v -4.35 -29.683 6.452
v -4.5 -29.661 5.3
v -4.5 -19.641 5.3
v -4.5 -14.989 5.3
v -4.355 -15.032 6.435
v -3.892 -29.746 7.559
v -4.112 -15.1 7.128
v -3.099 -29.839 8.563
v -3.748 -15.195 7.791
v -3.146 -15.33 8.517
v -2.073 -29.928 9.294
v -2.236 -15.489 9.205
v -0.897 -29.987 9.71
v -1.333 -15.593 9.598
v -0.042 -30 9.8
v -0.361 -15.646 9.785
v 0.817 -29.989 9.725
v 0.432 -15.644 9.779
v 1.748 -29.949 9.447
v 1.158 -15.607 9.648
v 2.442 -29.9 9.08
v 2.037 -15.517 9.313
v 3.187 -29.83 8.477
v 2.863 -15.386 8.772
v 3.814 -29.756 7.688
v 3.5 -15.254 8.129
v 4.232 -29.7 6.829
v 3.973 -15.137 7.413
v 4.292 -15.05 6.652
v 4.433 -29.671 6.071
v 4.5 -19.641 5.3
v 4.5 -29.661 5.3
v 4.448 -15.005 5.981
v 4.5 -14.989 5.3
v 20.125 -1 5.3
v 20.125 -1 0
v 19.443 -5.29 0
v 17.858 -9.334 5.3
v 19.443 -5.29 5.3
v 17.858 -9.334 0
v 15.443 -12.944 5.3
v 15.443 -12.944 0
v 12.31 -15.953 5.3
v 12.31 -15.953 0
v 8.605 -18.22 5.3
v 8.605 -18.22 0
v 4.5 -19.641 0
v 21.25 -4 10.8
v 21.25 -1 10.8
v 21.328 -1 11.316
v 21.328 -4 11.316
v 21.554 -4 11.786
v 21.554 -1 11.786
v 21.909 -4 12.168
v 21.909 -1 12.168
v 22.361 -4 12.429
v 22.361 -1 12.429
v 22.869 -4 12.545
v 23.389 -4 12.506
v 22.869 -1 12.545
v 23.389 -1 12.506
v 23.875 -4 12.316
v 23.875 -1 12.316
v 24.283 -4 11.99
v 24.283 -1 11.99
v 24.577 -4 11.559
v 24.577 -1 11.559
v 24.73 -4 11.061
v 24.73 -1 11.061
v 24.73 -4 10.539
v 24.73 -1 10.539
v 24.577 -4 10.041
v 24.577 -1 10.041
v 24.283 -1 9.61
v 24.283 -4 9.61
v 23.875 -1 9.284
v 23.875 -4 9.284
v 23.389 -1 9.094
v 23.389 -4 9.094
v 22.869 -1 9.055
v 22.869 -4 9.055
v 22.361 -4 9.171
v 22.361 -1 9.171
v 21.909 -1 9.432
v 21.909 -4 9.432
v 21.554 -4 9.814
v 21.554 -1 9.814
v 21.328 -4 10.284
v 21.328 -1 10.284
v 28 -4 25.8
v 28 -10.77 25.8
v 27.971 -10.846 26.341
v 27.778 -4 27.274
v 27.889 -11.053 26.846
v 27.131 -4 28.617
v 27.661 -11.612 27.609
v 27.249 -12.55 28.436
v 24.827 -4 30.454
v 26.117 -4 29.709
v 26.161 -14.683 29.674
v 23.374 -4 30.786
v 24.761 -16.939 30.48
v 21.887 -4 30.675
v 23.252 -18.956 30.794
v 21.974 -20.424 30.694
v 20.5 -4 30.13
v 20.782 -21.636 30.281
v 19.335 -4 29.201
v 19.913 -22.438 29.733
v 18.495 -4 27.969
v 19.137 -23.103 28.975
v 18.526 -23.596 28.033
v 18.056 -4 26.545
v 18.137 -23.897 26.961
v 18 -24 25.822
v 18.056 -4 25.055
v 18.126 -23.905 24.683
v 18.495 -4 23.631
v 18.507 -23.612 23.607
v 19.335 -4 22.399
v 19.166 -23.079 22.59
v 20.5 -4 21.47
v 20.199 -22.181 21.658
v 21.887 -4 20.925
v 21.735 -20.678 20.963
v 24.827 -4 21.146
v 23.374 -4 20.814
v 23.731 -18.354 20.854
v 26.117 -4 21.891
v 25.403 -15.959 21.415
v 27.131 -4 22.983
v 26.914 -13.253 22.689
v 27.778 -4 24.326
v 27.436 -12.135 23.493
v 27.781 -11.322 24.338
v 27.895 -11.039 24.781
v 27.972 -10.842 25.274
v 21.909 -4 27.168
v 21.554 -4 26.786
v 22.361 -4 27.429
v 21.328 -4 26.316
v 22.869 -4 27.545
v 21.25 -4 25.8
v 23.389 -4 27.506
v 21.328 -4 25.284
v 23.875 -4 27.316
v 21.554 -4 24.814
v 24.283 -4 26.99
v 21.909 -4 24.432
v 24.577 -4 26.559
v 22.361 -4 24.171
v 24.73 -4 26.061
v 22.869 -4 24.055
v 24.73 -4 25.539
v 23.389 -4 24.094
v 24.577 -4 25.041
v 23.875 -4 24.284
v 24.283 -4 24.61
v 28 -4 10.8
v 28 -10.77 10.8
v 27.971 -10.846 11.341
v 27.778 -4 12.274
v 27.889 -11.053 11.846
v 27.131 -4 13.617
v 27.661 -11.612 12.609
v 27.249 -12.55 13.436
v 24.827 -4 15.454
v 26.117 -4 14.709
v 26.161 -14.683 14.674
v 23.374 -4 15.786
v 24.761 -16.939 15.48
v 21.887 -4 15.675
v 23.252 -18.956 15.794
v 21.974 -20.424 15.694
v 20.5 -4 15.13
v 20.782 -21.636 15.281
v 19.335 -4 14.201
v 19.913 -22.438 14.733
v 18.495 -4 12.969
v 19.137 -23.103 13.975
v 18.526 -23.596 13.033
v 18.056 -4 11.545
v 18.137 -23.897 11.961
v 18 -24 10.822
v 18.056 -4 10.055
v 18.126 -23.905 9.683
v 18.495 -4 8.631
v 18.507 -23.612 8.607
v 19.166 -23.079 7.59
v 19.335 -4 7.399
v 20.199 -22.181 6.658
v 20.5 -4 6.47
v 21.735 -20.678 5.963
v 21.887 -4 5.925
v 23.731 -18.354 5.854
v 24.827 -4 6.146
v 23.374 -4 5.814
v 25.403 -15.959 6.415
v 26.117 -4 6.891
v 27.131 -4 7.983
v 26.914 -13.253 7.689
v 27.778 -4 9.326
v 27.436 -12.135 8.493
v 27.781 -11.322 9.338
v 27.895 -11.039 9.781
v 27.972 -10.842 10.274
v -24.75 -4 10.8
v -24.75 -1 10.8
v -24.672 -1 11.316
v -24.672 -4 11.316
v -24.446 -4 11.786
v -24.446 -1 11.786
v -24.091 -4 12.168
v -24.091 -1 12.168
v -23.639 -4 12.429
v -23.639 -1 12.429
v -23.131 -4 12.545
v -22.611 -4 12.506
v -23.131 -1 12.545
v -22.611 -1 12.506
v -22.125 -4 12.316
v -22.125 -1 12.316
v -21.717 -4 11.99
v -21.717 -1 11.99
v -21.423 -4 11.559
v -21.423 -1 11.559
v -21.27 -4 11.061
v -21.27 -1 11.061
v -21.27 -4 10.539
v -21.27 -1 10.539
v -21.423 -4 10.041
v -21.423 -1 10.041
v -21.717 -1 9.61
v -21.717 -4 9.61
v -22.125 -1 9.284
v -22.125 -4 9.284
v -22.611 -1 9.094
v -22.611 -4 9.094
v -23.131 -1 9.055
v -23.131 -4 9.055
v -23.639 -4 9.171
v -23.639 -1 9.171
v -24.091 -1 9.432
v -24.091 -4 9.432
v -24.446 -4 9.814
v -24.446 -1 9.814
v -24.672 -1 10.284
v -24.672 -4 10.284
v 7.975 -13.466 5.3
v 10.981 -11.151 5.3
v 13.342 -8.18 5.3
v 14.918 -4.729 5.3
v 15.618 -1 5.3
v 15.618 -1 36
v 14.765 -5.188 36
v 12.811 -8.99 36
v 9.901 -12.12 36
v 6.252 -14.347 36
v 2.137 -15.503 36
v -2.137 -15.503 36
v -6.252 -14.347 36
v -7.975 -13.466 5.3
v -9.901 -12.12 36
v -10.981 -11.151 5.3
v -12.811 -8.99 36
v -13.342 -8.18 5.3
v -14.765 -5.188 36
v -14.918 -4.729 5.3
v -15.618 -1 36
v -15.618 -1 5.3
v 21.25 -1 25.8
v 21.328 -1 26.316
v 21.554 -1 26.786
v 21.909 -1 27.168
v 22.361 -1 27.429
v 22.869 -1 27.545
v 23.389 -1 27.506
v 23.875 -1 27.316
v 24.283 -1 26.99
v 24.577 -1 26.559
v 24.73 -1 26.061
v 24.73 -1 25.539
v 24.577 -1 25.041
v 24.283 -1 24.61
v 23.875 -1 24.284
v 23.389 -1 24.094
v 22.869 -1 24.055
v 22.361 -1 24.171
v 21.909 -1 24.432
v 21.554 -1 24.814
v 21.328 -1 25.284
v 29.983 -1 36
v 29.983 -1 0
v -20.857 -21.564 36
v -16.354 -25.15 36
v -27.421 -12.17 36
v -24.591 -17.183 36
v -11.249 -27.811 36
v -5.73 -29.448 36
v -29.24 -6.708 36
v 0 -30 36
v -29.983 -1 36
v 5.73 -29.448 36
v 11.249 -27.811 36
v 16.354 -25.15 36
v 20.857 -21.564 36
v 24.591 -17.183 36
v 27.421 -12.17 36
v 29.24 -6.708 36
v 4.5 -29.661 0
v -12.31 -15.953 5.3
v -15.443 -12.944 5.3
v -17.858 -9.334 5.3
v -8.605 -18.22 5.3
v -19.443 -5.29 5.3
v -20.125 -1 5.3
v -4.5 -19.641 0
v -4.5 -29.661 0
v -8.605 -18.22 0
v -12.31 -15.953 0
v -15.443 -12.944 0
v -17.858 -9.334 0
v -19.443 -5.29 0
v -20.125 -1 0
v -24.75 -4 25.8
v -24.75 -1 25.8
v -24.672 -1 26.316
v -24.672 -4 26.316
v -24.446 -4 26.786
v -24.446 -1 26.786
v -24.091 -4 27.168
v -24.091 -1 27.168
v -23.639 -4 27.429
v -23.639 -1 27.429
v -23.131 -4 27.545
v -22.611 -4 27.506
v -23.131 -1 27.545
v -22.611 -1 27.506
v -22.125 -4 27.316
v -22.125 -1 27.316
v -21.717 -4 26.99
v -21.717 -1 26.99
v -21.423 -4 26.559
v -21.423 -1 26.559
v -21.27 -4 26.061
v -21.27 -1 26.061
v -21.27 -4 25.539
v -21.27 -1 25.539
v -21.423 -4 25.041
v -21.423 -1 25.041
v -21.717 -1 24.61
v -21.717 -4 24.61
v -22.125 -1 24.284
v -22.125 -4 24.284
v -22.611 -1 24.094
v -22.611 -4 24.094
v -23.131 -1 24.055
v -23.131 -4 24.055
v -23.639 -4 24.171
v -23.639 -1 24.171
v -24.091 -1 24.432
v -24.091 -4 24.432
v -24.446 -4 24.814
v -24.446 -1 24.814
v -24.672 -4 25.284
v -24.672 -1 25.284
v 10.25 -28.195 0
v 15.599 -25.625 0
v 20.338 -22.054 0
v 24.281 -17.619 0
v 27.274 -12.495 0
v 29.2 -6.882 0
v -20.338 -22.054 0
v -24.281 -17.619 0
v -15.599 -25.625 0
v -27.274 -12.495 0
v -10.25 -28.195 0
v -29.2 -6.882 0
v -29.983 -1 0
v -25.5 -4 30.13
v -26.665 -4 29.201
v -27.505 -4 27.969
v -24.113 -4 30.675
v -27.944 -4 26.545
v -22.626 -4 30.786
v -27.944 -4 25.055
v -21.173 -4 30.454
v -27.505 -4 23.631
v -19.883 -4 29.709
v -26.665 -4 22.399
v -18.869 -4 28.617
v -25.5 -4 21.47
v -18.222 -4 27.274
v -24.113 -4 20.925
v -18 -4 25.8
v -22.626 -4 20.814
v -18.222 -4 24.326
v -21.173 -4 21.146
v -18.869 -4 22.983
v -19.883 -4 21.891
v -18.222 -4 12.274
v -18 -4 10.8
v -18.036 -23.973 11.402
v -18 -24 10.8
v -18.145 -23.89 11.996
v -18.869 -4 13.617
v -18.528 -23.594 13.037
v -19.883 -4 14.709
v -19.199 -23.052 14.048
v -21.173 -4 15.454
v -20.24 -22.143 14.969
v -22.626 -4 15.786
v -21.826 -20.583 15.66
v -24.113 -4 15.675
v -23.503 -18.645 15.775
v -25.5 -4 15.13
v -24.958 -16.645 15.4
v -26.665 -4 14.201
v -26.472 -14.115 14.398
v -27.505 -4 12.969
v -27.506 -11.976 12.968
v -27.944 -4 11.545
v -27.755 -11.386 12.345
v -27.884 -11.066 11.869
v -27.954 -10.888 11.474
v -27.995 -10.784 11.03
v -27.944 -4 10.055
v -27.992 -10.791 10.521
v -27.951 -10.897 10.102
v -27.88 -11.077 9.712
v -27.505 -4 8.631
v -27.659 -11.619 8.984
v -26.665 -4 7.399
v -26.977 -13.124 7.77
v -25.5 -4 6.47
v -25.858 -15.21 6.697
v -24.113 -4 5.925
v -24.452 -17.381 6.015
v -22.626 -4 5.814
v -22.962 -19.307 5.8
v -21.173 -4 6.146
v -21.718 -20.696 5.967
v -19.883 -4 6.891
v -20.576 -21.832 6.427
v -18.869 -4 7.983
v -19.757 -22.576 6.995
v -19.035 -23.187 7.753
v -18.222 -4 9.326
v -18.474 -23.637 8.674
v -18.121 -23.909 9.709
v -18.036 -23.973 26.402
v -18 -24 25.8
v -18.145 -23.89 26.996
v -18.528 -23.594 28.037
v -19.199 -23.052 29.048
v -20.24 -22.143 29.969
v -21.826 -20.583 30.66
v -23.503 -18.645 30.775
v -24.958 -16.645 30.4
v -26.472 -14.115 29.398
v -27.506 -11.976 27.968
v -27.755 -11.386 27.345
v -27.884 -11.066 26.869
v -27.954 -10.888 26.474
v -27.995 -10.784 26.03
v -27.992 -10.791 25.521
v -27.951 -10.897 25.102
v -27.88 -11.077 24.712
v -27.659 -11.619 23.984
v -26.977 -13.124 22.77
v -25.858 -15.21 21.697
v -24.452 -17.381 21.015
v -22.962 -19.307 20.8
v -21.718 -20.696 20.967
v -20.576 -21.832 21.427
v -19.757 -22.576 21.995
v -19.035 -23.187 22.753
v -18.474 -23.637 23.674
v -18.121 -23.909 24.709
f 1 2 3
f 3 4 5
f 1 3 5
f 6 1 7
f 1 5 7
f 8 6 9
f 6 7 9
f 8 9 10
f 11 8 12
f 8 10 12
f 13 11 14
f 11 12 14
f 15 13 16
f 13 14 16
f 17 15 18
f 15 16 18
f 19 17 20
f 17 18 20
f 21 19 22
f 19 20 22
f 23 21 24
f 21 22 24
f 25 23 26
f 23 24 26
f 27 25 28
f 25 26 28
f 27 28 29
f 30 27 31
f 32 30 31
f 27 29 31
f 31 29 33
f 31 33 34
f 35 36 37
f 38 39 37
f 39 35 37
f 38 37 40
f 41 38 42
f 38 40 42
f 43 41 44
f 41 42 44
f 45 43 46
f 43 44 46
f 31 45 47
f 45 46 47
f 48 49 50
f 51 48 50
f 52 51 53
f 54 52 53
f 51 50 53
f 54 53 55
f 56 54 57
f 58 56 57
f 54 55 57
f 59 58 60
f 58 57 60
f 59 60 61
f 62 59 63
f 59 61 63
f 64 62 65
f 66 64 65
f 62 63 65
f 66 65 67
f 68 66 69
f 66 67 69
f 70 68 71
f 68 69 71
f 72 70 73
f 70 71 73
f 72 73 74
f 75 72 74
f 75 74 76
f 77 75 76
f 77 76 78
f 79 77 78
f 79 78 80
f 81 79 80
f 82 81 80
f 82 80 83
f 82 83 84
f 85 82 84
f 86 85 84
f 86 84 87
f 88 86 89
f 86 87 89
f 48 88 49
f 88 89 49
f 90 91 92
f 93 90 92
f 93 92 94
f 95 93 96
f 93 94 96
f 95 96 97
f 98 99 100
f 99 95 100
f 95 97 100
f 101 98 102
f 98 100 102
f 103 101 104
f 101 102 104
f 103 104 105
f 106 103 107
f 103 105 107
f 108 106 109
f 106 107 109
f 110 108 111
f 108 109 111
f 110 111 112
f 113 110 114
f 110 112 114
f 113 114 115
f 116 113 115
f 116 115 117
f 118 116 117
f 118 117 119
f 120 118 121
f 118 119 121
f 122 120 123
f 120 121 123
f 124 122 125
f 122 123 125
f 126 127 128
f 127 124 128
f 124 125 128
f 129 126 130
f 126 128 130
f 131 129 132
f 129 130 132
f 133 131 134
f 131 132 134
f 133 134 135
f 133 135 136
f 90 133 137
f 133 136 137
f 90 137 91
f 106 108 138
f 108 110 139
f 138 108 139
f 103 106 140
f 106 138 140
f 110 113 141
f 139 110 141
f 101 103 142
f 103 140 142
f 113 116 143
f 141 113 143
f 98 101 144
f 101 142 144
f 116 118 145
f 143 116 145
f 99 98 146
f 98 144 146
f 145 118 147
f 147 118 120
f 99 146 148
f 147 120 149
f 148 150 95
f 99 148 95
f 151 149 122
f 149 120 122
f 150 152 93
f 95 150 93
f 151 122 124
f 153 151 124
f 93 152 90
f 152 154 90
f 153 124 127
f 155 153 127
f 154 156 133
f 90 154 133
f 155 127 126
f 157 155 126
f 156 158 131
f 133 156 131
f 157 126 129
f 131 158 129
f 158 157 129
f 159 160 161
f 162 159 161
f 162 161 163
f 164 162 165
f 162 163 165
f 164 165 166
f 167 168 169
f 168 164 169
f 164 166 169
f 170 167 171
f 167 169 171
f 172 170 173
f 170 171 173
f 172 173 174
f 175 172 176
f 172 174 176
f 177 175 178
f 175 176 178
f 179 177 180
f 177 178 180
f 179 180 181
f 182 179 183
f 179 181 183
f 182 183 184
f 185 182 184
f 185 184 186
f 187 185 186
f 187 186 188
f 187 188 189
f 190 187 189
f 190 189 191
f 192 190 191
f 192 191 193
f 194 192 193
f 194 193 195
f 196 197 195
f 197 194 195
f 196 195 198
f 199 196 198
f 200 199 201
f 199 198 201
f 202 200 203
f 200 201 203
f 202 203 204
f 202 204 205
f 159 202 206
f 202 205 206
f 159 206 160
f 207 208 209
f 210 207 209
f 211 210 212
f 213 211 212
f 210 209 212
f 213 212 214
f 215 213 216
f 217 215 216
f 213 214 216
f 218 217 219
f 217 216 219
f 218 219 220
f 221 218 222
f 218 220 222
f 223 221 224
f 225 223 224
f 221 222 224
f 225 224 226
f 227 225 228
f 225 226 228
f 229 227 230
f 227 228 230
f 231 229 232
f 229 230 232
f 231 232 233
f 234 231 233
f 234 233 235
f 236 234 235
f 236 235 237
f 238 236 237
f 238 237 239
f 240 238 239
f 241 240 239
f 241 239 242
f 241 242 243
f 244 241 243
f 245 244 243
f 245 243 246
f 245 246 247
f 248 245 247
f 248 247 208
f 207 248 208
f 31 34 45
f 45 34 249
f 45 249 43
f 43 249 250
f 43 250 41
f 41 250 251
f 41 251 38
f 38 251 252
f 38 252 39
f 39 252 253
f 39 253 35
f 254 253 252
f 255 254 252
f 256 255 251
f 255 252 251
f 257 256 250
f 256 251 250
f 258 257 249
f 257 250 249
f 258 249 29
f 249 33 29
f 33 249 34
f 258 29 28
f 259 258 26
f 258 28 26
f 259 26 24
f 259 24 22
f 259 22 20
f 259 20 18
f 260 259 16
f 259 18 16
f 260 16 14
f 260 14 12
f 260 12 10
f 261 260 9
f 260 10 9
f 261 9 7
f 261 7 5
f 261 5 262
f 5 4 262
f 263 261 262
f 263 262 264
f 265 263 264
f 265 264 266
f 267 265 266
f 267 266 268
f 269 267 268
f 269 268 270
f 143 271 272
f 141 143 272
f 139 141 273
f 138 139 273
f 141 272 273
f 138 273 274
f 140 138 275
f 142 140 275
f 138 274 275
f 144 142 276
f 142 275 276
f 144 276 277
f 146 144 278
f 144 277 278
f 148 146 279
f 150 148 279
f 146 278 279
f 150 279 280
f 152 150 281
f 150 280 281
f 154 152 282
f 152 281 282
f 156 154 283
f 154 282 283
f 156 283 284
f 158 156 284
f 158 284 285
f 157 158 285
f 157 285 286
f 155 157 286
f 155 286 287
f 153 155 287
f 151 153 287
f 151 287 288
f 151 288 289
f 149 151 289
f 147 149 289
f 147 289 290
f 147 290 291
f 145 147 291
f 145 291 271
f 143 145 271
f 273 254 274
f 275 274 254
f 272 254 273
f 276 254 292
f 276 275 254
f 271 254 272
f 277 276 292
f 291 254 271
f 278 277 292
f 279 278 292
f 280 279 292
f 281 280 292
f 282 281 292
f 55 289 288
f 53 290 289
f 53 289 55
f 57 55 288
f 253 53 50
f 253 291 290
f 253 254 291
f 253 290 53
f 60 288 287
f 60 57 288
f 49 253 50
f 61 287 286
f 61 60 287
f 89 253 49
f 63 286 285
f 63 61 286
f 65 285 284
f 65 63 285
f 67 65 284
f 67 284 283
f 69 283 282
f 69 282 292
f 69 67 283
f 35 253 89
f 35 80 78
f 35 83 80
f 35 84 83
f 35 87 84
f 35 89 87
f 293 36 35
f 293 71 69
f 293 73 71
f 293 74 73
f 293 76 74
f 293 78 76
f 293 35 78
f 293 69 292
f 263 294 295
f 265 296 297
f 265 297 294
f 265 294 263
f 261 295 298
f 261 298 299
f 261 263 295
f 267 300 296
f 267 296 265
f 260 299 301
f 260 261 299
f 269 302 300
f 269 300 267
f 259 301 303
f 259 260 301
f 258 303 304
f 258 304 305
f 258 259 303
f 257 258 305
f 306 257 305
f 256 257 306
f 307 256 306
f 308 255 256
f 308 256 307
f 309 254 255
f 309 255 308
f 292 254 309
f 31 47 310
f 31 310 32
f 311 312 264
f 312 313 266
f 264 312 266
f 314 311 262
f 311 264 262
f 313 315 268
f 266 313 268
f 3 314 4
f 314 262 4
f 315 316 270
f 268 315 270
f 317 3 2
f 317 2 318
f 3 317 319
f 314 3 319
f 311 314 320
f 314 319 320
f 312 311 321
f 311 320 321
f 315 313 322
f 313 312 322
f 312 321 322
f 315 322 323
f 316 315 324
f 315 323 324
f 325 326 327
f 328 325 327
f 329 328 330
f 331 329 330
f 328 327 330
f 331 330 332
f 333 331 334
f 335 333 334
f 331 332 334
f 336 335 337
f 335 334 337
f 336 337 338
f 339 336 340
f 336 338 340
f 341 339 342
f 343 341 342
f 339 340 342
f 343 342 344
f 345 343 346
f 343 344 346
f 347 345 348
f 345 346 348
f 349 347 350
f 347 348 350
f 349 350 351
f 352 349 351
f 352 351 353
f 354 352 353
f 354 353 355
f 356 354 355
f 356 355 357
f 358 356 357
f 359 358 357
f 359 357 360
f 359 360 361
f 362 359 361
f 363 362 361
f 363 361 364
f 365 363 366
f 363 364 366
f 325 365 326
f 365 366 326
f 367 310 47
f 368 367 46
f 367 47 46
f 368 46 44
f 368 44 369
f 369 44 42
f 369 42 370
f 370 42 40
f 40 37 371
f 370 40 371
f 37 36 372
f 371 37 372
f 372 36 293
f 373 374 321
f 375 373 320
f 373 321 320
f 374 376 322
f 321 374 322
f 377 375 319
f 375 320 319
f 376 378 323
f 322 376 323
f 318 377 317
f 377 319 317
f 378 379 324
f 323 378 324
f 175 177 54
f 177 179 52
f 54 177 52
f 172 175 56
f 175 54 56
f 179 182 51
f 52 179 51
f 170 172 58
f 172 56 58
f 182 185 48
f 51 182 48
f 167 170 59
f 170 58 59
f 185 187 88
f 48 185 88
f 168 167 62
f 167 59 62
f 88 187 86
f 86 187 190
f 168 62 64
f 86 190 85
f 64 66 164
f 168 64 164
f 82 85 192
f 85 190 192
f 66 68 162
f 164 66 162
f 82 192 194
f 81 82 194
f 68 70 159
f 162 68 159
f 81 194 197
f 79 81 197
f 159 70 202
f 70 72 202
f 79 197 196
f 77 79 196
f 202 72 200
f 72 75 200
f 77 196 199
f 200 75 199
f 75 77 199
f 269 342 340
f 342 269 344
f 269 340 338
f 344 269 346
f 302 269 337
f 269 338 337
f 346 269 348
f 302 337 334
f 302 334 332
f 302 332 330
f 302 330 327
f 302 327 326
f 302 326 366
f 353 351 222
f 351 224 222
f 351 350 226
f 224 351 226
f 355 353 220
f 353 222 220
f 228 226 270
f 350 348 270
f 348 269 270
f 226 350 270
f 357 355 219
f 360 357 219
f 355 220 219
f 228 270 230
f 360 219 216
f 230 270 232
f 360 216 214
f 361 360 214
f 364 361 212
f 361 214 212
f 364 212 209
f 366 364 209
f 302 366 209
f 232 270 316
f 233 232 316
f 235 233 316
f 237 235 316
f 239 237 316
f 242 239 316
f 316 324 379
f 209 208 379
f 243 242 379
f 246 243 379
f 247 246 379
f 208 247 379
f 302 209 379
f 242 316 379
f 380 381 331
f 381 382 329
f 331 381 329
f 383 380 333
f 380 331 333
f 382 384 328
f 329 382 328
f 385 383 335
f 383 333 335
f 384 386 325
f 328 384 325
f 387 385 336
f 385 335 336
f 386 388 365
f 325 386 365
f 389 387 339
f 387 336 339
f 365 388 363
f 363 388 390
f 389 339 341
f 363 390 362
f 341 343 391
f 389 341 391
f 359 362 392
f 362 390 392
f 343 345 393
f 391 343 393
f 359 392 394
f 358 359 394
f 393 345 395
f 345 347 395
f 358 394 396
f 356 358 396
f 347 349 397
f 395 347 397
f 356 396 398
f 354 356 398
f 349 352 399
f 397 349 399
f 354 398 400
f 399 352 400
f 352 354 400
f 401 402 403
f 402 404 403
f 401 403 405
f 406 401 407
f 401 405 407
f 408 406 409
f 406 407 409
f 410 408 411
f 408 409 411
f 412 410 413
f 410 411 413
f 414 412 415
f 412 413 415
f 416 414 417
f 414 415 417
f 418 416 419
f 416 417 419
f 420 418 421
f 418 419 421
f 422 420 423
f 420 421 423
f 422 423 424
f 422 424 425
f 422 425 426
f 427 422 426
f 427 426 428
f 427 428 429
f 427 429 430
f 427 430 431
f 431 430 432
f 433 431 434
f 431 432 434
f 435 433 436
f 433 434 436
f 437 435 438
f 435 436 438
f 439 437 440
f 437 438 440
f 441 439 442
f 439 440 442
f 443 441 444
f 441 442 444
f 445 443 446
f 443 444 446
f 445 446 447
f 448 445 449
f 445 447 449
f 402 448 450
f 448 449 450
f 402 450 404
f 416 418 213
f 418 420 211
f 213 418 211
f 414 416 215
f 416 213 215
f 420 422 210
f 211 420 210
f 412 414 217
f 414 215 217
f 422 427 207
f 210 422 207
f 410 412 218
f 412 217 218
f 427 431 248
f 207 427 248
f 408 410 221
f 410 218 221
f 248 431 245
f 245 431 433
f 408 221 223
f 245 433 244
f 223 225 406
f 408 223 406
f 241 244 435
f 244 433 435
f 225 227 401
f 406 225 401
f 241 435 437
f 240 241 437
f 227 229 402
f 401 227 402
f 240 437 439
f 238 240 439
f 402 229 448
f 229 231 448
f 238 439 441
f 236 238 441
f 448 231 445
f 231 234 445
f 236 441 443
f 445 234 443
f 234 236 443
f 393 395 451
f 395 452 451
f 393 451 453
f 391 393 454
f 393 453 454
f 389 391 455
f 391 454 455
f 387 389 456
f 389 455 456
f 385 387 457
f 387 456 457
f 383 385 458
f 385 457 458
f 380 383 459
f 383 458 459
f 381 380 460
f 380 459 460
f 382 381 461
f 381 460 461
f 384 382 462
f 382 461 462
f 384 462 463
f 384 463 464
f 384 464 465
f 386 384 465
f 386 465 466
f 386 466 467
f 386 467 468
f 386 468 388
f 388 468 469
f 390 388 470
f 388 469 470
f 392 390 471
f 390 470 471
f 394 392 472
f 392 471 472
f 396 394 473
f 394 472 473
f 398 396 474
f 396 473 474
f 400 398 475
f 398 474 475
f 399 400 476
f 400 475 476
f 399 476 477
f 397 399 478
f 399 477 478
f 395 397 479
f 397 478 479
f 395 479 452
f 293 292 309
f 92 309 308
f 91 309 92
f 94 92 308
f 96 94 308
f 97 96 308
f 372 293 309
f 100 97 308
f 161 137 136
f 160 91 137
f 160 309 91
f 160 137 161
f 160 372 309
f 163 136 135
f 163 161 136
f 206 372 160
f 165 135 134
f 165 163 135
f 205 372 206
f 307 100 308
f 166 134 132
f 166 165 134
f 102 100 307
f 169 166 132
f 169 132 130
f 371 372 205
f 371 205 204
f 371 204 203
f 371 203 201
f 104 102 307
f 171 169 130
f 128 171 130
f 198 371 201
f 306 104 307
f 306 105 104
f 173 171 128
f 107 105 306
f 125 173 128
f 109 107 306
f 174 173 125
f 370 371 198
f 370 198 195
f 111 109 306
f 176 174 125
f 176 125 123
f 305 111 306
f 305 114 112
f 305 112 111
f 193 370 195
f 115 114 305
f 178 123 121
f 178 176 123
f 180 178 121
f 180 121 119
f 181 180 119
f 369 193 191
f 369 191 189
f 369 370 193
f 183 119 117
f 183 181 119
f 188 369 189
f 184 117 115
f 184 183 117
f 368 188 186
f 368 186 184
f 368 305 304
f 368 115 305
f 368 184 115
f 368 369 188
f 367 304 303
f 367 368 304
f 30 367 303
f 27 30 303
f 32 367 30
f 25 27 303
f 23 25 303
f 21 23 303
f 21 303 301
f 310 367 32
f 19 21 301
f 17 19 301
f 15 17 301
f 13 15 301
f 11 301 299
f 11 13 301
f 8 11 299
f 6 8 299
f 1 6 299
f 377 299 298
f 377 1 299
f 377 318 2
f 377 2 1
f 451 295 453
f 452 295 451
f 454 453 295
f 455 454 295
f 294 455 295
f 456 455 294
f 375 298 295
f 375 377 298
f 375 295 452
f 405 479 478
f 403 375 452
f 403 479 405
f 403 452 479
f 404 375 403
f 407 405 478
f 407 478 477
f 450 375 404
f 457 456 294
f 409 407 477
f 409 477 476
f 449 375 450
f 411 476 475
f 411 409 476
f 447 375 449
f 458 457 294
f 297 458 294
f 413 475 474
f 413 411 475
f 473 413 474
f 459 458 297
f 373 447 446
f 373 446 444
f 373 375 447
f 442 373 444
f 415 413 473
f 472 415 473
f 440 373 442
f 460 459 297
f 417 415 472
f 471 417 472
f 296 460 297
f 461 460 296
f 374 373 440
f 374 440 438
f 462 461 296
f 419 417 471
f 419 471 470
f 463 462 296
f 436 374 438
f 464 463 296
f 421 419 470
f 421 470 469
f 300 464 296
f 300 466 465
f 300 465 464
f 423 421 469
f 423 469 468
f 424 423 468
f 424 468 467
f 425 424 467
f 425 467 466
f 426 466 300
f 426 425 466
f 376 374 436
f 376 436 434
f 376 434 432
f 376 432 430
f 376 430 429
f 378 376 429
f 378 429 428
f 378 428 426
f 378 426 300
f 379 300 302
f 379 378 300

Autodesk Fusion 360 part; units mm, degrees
sketch "Skizze1" plane through (0, 0, 0) normal (0, 0, 1) x (1, 0, 0)
  line L0 (-46.6781, -1) -> (43.3215, -1) construction
  arc A0 (-29.9833, -1) -> (29.9833, -1) centre (0, 0) ccw
  arc A1 (-20.1252, -1) -> (20.1252, -1) centre (0, 0) ccw
  arc A2 (-15.618, -1) -> (15.618, -1) centre (0, 0) ccw
  line L1 (15.618, -1) -> (29.9833, -1)
  line L2 (-15.618, -1) -> (-29.9833, -1)
  point P0 (-29.9833, -1)
  point P1 (-20.1252, -1)
  point P2 (-15.618, -1)
  point P3 (15.618, -1)
  point P4 (20.1252, -1)
  point P5 (29.9833, -1)
  dimension "d6" = 1
  dimension "d7" = 30
  dimension "d8" = 20.15
  dimension "d9" = 15.65
extrude "Extrusion1" add sketch "Skizze1" along normal blind 36
extrude "Extrusion2" cut sketch "Skizze1" along normal blind 5.3 contours A1 A2 L1 L2
sketch "Skizze3" plane through (0, -1, 0) normal (0, 1, 0) x (-1, 0, 0)
  line L0 (20.1252, 5.3) -> (20.1252, 0)
  line L1 (20.1252, 0) -> (29.9833, 0)
  line L2 (29.9833, 0) -> (29.9833, 36)
  line L3 (29.9833, 36) -> (15.618, 36)
  line L4 (15.618, 36) -> (15.618, 5.3)
  line L5 (15.618, 5.3) -> (20.1252, 5.3)
  line L6 (-23, 38.9334) -> (-23, -25) construction
  line L7 (23, 38.9334) -> (23, -33.2487) construction
  line L8 (-52.1355, 10.8) -> (51.6739, 10.8) construction
  line L9 (-50.0712, 25.8) -> (44.4743, 25.8) construction
  circle A0 centre (-23, 25.8) radius 1.75
  circle A1 centre (-23, 10.8) radius 1.75
  circle A2 centre (23, 25.8) radius 1.75
  circle A3 centre (23, 10.8) radius 1.75
  line L10 (-51.02, 5.3) -> (55, 5.3) construction
  line L11 (0, 38.1175) -> (0, -20) construction
  line L12 (-4.5, 5.3) -> (4.5, 5.3)
  line L13 (4.5, 5.3) -> (4.5, -4.7)
  line L14 (4.5, -4.7) -> (-4.5, -4.7)
  line L15 (-4.5, -4.7) -> (-4.5, 5.3)
  arc A4 (4.5, 5.3) -> (-4.5, 5.3) centre (0, 5.3) ccw
  point P0 (-23, 25.8)
  point P1 (-23, 10.8)
  point P2 (23, 25.8)
  point P3 (23, 10.8)
  dimension "d14" = 10.8
  dimension "d15" = 25.8
  dimension "d17" = 3.5
  dimension "d18" = 3.5
  dimension "d19" = 3.5
  dimension "d20" = 3.5
  dimension "d21" = 5.3
  dimension "d29" = 23
  dimension "d30" = 23
extrude "Extrusion3" cut sketch "Skizze3" against normal blind 100 contours A0 | A1 | A2 | A3 | L12 A4 | L12 L13 L14 L15
ref_plane "Arbeitsebene1" through (0, -30, 0) normal (0, 1, 0) x (0, 0, 1)
sketch "Skizze5" plane through (0, -30, 0) normal (0, 1, 0) x (1, 0, 0)
  line L0 (23, -32.4719) -> (23, 19) construction
  line L1 (-23, -30.4738) -> (-23, 19) construction
  line L2 (48, -10.8) -> (-39, -10.8) construction
  line L3 (47, -25.8) -> (-45, -25.8) construction
  circle A0 centre (23, -25.8) radius 5
  circle A1 centre (23, -10.8) radius 5
  circle A2 centre (-23, -25.8) radius 5
  circle A3 centre (-23, -10.8) radius 5
  dimension "d27" = 23
  dimension "d31" = 23
  dimension "d32" = 10.8
  dimension "d33" = 25.8
  dimension "d34" = 10
  dimension "d35" = 10
  dimension "d36" = 10
  dimension "d37" = 10
extrude "Extrusion4" cut sketch "Skizze5" along normal blind 26
